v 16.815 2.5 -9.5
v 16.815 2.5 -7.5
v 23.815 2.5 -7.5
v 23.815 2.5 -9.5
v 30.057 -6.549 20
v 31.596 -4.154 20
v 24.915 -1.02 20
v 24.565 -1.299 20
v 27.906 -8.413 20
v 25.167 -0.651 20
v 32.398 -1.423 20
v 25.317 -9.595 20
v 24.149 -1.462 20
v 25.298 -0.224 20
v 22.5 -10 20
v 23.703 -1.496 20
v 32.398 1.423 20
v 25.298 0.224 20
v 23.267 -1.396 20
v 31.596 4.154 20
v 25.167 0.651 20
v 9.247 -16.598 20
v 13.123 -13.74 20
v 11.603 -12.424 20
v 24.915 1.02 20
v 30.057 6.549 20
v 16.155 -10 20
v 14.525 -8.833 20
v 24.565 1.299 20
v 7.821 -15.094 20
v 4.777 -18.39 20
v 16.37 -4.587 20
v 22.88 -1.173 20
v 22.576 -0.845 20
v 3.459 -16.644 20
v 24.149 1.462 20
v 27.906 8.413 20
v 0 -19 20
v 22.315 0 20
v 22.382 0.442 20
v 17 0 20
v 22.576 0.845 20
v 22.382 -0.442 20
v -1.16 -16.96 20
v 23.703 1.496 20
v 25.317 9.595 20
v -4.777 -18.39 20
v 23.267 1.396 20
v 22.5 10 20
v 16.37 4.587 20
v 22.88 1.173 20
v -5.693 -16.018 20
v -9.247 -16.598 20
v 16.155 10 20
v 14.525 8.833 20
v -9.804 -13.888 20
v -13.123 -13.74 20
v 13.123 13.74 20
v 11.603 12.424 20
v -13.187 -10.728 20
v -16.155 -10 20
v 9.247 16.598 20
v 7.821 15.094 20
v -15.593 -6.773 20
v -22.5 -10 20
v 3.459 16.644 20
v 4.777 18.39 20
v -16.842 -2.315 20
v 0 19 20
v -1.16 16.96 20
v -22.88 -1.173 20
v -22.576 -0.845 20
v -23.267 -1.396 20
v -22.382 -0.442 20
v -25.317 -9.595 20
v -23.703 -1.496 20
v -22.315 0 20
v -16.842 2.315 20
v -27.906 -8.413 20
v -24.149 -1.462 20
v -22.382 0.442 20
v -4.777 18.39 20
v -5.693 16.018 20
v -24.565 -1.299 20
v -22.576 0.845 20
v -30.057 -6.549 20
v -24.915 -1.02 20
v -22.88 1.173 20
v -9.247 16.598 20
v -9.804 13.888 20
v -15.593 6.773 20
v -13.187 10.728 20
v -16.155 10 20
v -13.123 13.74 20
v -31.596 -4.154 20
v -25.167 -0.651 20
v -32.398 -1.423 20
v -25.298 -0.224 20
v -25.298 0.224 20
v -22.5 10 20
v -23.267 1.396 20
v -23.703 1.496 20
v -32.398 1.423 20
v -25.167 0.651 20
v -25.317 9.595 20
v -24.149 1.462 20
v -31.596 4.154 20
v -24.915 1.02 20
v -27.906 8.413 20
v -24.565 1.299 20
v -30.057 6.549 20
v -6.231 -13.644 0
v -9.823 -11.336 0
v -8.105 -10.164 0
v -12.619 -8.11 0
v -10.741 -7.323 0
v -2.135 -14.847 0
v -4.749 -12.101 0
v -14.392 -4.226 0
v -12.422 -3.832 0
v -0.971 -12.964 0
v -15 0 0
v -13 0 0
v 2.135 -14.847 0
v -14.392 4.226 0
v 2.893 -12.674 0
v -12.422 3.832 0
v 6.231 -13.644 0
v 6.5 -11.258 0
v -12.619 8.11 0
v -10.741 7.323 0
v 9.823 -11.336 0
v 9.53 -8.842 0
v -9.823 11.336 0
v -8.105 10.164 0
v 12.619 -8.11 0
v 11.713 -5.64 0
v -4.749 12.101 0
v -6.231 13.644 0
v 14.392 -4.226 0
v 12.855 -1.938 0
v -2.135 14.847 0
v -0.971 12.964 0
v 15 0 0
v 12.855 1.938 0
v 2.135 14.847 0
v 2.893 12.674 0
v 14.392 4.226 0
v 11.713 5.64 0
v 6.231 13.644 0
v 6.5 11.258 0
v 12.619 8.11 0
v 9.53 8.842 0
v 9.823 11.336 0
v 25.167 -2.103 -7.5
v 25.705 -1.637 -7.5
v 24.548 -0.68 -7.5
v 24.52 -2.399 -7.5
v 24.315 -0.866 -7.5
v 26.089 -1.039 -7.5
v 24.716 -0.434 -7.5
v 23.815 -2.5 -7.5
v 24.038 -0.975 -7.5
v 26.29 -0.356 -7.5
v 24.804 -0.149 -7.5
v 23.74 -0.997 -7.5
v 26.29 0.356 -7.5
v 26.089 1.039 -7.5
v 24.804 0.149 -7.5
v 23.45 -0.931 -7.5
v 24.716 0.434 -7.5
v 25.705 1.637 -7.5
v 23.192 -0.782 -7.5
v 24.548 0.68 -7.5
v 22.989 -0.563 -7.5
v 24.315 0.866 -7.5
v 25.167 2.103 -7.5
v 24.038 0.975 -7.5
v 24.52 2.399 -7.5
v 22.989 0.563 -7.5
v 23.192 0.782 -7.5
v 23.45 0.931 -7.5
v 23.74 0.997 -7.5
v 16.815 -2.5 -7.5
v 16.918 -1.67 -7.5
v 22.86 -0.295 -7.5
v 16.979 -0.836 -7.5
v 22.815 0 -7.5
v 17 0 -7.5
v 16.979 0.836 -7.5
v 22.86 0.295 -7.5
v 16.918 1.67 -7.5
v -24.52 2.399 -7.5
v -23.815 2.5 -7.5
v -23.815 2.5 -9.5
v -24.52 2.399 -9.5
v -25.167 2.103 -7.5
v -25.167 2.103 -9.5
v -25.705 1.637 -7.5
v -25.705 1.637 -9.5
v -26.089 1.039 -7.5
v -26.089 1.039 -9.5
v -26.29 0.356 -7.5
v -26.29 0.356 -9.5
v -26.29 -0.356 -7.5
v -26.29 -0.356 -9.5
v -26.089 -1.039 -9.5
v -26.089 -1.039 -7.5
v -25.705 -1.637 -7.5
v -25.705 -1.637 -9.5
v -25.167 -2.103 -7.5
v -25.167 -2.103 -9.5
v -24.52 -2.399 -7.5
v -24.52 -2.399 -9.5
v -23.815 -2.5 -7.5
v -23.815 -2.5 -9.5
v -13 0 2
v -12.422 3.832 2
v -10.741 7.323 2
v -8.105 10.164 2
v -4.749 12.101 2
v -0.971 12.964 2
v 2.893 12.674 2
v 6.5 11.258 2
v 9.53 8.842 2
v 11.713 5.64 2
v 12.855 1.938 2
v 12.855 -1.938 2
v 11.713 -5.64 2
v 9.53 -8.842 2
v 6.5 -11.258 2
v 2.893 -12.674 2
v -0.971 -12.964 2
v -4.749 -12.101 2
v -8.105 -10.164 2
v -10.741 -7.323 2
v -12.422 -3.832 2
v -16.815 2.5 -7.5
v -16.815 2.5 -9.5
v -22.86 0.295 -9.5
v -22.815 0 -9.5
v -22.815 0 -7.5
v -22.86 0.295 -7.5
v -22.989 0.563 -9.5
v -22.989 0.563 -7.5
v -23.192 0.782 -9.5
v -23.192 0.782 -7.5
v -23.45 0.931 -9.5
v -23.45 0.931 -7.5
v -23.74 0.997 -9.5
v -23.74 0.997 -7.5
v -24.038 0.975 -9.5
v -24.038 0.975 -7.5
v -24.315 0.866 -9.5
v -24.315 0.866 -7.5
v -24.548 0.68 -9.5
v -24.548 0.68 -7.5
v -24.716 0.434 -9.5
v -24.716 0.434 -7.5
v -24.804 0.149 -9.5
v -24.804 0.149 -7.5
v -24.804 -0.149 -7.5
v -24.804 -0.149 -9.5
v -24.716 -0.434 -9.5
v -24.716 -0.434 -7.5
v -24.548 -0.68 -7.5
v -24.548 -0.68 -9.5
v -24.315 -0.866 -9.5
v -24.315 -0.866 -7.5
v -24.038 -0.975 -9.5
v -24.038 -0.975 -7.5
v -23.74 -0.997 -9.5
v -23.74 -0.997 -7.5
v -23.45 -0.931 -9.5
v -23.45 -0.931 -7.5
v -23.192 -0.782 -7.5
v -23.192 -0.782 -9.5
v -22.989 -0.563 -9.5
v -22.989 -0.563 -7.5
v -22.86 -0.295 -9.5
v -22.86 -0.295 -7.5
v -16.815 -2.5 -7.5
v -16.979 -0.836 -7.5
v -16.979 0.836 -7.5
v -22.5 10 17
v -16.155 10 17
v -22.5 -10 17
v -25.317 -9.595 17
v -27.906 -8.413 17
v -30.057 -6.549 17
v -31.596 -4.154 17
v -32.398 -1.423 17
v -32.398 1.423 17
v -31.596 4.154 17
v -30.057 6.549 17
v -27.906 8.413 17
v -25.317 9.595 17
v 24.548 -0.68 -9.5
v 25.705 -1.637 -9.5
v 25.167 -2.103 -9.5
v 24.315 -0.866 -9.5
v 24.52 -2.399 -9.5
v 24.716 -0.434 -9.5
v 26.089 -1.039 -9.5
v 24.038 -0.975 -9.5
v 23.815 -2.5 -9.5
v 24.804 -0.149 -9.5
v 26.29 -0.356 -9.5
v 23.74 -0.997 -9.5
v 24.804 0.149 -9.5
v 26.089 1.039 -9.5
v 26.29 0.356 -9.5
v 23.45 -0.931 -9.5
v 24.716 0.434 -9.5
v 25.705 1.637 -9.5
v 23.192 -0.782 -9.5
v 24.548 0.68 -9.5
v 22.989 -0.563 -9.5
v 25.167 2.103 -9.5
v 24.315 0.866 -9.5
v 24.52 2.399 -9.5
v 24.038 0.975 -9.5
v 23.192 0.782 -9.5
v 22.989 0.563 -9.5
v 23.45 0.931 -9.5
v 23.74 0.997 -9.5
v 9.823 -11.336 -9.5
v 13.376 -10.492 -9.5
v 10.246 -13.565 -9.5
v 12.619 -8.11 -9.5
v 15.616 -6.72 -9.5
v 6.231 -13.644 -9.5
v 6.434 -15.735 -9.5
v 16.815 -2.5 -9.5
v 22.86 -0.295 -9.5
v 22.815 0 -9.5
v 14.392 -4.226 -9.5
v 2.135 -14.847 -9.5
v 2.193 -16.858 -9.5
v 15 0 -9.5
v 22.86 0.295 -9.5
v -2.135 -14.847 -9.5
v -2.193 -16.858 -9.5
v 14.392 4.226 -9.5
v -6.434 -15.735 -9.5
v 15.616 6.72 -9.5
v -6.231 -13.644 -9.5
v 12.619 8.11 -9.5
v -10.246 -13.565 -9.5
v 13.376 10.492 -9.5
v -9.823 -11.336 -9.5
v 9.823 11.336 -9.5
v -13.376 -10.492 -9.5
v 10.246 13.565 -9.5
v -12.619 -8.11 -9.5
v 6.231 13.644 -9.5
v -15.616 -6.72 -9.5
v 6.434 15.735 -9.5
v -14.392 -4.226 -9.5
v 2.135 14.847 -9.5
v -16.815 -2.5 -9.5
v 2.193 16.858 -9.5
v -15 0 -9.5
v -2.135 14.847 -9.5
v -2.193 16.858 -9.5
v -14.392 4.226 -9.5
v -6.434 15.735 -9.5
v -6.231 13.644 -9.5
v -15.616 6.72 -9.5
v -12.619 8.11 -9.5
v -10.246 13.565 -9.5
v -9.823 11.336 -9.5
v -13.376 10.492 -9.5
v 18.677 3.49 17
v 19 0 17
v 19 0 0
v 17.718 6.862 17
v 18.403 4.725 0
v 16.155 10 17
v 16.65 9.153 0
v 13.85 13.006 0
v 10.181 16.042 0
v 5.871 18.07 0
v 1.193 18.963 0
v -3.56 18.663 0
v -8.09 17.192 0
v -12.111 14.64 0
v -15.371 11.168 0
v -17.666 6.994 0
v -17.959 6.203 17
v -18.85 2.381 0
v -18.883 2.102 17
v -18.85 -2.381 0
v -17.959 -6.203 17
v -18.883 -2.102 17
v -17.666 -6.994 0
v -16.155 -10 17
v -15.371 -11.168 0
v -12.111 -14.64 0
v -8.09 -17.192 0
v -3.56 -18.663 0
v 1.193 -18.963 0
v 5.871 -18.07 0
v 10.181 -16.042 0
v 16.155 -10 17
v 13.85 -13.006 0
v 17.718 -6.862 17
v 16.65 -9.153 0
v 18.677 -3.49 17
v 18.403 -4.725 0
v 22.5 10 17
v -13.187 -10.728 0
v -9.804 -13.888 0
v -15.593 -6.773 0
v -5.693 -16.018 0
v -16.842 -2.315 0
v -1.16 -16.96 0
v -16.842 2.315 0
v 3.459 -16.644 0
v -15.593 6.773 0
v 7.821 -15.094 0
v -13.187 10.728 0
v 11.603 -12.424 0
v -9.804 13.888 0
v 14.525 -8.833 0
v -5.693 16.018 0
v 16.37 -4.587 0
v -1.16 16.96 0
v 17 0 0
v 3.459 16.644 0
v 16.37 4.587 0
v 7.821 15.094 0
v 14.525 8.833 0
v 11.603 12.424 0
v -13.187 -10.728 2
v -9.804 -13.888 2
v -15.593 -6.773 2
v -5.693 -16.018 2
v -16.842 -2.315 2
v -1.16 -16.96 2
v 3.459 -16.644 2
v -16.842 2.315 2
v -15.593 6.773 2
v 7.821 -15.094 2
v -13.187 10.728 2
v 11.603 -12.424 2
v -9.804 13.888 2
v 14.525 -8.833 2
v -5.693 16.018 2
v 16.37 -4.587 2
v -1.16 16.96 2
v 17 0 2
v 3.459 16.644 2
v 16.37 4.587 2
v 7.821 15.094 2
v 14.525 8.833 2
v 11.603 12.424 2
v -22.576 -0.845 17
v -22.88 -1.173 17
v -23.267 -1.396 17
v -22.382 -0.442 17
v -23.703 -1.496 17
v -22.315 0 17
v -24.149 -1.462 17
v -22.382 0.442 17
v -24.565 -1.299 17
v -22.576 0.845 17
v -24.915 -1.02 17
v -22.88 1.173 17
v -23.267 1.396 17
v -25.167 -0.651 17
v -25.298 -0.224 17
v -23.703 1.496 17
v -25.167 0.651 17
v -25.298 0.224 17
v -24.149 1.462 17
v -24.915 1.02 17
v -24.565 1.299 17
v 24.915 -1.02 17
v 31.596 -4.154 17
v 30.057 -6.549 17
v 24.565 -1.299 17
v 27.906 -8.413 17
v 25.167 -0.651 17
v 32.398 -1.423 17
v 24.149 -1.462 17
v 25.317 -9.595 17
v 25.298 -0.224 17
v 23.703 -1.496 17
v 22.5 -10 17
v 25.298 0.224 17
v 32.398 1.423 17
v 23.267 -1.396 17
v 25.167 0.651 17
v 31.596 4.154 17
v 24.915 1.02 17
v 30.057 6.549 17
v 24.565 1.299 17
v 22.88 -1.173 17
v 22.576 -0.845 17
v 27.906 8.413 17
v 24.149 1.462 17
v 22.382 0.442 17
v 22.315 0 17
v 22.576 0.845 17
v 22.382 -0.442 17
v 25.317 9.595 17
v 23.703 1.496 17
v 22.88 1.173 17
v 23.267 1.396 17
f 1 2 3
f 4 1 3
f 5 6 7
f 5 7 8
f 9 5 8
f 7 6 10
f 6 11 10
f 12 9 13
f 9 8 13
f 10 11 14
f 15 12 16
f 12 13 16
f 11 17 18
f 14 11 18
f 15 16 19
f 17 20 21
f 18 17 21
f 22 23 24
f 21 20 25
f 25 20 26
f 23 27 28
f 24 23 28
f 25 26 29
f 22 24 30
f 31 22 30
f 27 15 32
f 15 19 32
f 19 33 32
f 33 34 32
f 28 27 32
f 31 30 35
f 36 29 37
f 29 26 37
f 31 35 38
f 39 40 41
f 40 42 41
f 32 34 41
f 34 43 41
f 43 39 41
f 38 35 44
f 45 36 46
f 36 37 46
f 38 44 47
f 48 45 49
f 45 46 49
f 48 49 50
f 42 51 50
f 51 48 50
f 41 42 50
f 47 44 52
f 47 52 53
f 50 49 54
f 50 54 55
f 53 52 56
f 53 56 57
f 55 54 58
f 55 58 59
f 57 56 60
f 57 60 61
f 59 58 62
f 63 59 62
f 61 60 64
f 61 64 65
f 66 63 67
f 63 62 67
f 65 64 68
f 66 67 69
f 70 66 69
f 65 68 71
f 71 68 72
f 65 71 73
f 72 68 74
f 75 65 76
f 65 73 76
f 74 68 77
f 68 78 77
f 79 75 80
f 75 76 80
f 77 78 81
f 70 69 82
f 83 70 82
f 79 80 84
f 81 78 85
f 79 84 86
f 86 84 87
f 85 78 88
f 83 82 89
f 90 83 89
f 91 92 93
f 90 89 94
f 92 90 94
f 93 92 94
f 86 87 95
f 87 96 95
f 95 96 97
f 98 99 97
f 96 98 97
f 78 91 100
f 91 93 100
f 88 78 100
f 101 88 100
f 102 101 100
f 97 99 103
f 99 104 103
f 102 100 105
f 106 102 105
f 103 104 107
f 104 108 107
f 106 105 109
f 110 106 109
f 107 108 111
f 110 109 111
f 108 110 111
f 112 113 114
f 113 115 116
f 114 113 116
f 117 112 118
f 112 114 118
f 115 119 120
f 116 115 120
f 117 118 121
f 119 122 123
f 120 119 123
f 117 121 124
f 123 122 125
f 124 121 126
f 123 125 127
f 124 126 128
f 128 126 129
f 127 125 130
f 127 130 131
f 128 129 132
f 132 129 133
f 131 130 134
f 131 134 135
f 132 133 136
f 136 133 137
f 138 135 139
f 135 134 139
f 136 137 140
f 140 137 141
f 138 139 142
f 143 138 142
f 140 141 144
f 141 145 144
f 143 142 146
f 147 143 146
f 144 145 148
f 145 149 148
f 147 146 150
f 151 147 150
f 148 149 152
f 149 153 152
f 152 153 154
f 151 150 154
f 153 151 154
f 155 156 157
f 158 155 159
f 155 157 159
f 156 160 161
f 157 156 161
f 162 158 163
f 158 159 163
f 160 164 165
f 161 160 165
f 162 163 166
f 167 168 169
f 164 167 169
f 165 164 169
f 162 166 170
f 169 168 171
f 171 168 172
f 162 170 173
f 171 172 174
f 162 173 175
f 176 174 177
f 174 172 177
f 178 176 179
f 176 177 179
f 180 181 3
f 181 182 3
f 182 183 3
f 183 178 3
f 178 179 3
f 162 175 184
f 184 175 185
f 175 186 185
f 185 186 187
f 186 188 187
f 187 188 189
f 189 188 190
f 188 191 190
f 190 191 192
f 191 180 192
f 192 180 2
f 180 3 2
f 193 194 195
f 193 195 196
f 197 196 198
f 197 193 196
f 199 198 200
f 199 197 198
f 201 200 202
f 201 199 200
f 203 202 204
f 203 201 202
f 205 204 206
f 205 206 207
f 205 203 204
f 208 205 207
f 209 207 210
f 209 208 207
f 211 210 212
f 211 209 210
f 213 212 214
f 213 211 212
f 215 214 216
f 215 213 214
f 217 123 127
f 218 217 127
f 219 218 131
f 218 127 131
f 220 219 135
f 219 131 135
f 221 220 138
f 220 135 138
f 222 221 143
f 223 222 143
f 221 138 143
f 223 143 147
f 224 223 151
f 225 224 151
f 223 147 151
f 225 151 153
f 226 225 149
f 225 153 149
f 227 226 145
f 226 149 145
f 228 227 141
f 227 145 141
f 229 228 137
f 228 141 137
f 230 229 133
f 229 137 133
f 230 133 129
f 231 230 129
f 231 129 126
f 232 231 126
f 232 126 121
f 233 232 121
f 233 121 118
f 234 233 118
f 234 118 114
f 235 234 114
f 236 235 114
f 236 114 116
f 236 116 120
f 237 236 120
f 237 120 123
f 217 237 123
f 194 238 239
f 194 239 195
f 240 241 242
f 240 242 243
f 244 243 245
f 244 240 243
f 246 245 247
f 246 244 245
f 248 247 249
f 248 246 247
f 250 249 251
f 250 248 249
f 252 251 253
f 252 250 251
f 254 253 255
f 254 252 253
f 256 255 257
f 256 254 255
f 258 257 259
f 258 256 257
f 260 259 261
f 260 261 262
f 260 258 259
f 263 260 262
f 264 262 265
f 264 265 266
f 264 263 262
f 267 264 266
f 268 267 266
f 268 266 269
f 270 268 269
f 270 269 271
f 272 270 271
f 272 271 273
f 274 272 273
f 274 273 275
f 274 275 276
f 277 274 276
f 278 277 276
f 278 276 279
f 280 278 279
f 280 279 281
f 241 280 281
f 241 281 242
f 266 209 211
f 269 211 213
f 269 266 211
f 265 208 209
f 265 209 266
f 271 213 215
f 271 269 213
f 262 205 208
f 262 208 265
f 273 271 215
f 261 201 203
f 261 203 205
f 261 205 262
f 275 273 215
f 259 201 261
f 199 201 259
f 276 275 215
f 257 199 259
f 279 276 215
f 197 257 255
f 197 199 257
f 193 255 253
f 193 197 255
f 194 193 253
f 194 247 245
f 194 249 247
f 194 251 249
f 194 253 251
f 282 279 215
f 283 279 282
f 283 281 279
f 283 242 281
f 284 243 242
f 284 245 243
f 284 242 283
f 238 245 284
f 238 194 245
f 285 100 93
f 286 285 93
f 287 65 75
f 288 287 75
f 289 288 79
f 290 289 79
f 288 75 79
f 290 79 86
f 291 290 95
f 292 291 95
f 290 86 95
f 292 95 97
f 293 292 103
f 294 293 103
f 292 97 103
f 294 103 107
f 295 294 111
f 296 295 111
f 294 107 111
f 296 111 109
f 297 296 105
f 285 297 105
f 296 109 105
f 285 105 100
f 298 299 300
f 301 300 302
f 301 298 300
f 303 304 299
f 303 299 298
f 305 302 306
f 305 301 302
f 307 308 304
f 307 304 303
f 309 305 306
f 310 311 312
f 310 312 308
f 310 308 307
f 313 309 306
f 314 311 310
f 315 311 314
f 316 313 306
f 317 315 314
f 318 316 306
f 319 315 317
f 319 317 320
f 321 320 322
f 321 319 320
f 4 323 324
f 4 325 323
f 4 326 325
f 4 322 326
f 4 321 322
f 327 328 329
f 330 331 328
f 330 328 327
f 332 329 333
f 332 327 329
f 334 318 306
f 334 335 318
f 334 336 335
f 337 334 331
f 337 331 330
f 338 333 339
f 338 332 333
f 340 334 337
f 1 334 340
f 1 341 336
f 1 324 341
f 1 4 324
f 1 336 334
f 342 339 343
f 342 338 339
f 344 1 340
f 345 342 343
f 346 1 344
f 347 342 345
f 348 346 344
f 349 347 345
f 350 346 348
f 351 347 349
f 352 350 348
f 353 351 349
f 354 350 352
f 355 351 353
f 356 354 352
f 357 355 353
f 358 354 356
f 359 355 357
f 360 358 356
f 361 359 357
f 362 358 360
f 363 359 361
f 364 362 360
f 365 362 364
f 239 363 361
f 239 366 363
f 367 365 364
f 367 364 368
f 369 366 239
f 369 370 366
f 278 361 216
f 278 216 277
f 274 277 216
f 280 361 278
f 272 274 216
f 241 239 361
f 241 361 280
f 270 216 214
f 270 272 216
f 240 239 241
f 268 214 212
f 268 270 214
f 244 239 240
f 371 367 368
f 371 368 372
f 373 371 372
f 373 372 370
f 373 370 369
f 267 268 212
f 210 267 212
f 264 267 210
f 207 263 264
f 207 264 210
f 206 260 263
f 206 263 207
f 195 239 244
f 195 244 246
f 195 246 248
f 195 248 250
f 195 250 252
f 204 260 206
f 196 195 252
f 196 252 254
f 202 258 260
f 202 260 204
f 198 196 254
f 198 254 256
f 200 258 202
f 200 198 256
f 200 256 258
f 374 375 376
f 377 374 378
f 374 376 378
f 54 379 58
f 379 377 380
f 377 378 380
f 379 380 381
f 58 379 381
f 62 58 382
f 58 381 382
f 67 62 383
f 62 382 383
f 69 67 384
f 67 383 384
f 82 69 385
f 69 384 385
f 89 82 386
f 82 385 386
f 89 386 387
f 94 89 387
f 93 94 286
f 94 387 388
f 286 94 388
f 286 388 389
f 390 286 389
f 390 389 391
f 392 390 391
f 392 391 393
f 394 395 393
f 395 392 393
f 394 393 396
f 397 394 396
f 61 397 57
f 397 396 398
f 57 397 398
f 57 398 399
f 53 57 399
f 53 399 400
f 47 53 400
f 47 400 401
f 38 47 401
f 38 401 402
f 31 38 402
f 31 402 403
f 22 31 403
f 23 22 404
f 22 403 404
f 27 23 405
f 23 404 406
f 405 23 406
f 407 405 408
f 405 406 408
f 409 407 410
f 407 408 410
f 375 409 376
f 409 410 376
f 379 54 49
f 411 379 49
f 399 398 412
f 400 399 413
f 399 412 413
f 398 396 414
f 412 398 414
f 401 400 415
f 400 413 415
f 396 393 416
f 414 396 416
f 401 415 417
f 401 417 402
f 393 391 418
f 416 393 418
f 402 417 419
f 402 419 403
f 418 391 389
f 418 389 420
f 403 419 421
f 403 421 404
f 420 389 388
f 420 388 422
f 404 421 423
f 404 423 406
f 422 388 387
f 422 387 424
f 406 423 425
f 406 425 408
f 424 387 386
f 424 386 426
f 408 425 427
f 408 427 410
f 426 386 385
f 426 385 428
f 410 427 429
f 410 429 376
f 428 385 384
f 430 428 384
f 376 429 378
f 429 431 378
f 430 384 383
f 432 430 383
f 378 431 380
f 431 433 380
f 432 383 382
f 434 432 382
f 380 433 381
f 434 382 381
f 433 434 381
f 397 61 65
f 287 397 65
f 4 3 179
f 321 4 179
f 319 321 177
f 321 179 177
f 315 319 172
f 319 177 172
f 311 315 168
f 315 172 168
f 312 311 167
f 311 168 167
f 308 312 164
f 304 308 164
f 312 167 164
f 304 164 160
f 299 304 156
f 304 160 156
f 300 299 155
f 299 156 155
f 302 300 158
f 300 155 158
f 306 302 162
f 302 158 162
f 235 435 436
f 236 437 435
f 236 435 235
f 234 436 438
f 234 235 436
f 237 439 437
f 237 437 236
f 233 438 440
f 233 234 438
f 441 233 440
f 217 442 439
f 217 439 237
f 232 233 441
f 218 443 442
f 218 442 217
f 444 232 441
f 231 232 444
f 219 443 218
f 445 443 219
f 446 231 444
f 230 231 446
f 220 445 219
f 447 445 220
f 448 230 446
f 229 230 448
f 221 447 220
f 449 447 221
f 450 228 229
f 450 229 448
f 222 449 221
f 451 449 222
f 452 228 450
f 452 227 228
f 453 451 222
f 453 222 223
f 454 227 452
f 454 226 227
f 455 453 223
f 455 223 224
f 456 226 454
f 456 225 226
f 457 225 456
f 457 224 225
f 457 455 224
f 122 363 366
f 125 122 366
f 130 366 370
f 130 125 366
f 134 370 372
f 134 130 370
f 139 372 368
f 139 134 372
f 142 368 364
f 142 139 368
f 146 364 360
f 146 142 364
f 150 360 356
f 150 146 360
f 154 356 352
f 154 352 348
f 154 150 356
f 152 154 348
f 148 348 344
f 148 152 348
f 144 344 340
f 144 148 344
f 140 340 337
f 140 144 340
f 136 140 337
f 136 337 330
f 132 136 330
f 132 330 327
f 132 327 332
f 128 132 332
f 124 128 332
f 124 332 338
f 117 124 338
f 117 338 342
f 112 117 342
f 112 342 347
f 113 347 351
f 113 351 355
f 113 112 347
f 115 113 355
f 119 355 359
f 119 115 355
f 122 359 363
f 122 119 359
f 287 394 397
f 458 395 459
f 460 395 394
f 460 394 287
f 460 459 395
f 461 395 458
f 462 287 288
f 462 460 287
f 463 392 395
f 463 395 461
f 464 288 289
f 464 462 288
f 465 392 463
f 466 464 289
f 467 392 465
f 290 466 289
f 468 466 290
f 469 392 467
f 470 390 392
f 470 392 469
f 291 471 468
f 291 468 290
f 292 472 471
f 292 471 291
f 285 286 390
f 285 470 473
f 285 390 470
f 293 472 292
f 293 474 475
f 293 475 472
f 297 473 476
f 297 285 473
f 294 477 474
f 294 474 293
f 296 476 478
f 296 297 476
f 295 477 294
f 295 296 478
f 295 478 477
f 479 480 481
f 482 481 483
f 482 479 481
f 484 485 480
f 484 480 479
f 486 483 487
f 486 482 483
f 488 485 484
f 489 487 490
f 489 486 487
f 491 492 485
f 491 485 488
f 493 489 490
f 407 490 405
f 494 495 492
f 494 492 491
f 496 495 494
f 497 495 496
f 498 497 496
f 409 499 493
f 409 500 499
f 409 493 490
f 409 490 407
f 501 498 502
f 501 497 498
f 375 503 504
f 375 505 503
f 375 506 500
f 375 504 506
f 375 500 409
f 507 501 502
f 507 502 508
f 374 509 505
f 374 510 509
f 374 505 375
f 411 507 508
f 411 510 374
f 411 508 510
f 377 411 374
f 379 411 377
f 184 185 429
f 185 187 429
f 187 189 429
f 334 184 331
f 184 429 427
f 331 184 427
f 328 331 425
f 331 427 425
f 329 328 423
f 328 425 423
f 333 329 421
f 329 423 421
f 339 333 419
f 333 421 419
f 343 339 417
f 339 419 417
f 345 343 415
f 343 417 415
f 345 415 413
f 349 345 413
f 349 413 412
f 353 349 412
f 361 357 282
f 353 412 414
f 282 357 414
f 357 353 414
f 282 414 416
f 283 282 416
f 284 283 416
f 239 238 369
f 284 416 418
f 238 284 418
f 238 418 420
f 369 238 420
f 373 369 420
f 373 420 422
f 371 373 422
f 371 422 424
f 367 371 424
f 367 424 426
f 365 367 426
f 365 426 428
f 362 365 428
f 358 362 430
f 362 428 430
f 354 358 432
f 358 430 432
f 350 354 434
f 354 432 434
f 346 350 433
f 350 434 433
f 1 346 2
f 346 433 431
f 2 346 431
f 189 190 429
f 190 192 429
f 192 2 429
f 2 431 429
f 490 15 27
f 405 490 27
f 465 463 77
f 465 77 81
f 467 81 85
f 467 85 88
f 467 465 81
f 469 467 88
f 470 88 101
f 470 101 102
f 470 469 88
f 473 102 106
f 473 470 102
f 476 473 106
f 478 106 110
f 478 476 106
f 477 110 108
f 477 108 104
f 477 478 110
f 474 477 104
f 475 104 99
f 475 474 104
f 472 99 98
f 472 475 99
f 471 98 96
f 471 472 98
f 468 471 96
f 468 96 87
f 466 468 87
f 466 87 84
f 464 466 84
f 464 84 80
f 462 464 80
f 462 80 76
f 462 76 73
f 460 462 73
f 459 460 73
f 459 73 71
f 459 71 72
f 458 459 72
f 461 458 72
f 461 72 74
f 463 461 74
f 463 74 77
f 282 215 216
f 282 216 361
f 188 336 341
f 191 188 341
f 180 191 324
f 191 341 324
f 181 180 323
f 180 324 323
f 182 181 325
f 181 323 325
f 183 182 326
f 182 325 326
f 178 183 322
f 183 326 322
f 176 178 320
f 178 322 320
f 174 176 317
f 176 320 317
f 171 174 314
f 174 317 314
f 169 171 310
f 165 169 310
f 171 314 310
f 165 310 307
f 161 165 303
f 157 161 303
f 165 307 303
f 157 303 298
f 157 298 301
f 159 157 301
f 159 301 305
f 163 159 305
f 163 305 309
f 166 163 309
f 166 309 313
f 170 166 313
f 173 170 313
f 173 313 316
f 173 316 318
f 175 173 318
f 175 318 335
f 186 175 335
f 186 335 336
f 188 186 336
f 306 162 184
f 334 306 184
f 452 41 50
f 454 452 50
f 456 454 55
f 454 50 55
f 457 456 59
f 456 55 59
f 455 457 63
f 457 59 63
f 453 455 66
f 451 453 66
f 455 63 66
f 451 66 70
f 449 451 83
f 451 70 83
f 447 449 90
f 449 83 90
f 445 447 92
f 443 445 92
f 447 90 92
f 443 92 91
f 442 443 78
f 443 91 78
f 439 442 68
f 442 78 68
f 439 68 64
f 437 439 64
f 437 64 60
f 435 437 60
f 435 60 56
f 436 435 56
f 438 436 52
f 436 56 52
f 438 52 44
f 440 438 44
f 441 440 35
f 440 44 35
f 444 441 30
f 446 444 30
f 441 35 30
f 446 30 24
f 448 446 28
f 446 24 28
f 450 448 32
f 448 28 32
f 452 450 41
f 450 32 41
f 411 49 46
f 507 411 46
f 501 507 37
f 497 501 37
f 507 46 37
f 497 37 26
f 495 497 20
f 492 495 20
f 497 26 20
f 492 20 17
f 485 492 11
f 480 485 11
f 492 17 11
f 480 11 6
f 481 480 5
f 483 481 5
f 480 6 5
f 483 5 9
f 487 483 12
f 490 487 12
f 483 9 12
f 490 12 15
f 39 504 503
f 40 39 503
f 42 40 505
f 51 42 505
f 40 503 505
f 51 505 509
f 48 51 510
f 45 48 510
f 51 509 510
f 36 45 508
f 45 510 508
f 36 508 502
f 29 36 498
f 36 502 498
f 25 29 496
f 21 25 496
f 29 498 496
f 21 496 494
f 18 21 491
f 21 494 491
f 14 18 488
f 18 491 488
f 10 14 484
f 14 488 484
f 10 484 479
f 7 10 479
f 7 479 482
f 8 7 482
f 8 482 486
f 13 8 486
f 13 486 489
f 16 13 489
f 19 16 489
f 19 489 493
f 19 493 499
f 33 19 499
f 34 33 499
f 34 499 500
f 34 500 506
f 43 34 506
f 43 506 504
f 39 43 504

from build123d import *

# Parameters (mm, degrees)
SKETCH_1_R          = 19
EXTRUDE_1_DEPTH     = 20
EXTRUDE_2_DEPTH     = 3
SKETCH_6_R          = 17
CUT_EXTRUDE_1_DEPTH = 18
SKETCH_7_R          = 17
SKETCH_7_R_2        = 15
EXTRUDE_3_DEPTH     = 9.5
CUT_EXTRUDE_2_REACH = 44.629
SKETCH_8_R          = 13
EXTRUDE_START       = -2
EXTRUDE_4_DEPTH     = 2
CUT_EXTRUDE_3_REACH = 49.828
SKETCH_14_R         = 1
CUT_EXTRUDE_4_REACH = 48.038
SKETCH_15_R         = 1.5


with BuildPart() as part:
    # 草图1 → 凸台-拉伸1 (new body)
    with BuildSketch(Plane.XY):
        Circle(SKETCH_1_R)
    extrude(amount=EXTRUDE_1_DEPTH)

    # 草图3 → 凸台-拉伸2 (add)
    with BuildSketch(Plane.XY.offset(20)):
        with BuildLine():
            Line((-22.5, 10), (22.5, 10))
            ThreePointArc((22.5, 10), (32.5, 0), (22.5, -10))
            Line((22.5, -10), (-22.5, -10))
            ThreePointArc((-22.5, -10), (-32.5, 0), (-22.5, 10))
        make_face()
    extrude(amount=-EXTRUDE_2_DEPTH)

    # 草图6 → 切除-拉伸1 (cut)
    with BuildSketch(Plane.XY.offset(20)):
        Circle(SKETCH_6_R)
    extrude(amount=-CUT_EXTRUDE_1_DEPTH, mode=Mode.SUBTRACT)

    # 草图7 → 凸台-拉伸3 (add)
    with BuildSketch(Plane(origin=(0, 0, 0), x_dir=(-1, 0, 0), z_dir=(0, 0, -1))):
        with Locations(Location((0, 0, 0), (0, 0, 180))):
            Circle(SKETCH_7_R)
        Circle(SKETCH_7_R_2, mode=Mode.SUBTRACT)
    extrude(amount=EXTRUDE_3_DEPTH)

    # 草图8 → 切除-拉伸2 (cut, up to next)
    with BuildSketch(Plane(origin=(0, 0, 0), x_dir=(-1, 0, 0), z_dir=(0, 0, -1)), mode=Mode.PRIVATE) as cut_extrude_2_sk1:
        Circle(SKETCH_8_R)
    cut_extrude_2_tool1 = extrude(cut_extrude_2_sk1.sketch, amount=-CUT_EXTRUDE_2_REACH, mode=Mode.PRIVATE) & part.part
    add(cut_extrude_2_tool1.solids().sort_by_distance((0, 0, 0))[0], mode=Mode.SUBTRACT)

    # 草图10 → 凸台-拉伸4 (add)
    with BuildSketch(Plane(origin=(0, 0, -9.5), x_dir=(-1, 0, 0), z_dir=(0, 0, -1)).offset(EXTRUDE_START)):
        with BuildLine():
            Line((-16.815171721, 2.5), (-23.815171721, 2.5))
            ThreePointArc((-23.815171721, 2.5), (-26.315171721, 0), (-23.815171721, -2.5))
            Line((-23.815171721, -2.5), (-16.815171721, -2.5))
            ThreePointArc((-16.815171721, -2.5), (-17, 0), (-16.815171721, 2.5))
        make_face()
        with BuildLine():
            Line((16.815171721, 2.5), (23.815171721, 2.5))
            ThreePointArc((23.815171721, 2.5), (26.315171721, 0), (23.815171721, -2.5))
            Line((23.815171721, -2.5), (16.815171721, -2.5))
            ThreePointArc((16.815171721, -2.5), (17, 0), (16.815171721, 2.5))
        make_face()
    extrude(amount=EXTRUDE_4_DEPTH)

    # 草图14 → 切除-拉伸3 (cut, up to next)
    with BuildSketch(Plane(origin=(0, 0, -9.5), x_dir=(-1, 0, 0), z_dir=(0, 0, -1)), mode=Mode.PRIVATE) as cut_extrude_3_sk1:
        with Locations((-23.815171721, 0)):
            Circle(SKETCH_14_R)
    cut_extrude_3_tool1 = extrude(cut_extrude_3_sk1.sketch, amount=-CUT_EXTRUDE_3_REACH, mode=Mode.PRIVATE) & part.part
    cut_extrude_3 = cut_extrude_3_tool1.solids().sort_by_distance((23.815172, 0, -9.5))[0]
    add(cut_extrude_3, mode=Mode.SUBTRACT)

    # 草图15 → 切除-拉伸4 (cut, up to next)
    with BuildSketch(Plane(origin=(0, 0, 17), x_dir=(-1, 0, 0), z_dir=(0, 0, -1)), mode=Mode.PRIVATE) as cut_extrude_4_sk1:
        with Locations((-23.815171721, 0)):
            Circle(SKETCH_15_R)
    cut_extrude_4_tool1 = extrude(cut_extrude_4_sk1.sketch, amount=-CUT_EXTRUDE_4_REACH, mode=Mode.PRIVATE) & part.part
    cut_extrude_4 = cut_extrude_4_tool1.solids().sort_by_distance((23.815172, 0, 17))[0]
    add(cut_extrude_4, mode=Mode.SUBTRACT)

    # 镜向1: 切除-拉伸3, 切除-拉伸4 across plane
    add(cut_extrude_3.mirror(Plane(origin=(0, 0, 0), x_dir=(0, 0, 1), z_dir=(1, 0, 0))), mode=Mode.SUBTRACT)
    add(cut_extrude_4.mirror(Plane(origin=(0, 0, 0), x_dir=(0, 0, 1), z_dir=(1, 0, 0))), mode=Mode.SUBTRACT)


solid = part.part
